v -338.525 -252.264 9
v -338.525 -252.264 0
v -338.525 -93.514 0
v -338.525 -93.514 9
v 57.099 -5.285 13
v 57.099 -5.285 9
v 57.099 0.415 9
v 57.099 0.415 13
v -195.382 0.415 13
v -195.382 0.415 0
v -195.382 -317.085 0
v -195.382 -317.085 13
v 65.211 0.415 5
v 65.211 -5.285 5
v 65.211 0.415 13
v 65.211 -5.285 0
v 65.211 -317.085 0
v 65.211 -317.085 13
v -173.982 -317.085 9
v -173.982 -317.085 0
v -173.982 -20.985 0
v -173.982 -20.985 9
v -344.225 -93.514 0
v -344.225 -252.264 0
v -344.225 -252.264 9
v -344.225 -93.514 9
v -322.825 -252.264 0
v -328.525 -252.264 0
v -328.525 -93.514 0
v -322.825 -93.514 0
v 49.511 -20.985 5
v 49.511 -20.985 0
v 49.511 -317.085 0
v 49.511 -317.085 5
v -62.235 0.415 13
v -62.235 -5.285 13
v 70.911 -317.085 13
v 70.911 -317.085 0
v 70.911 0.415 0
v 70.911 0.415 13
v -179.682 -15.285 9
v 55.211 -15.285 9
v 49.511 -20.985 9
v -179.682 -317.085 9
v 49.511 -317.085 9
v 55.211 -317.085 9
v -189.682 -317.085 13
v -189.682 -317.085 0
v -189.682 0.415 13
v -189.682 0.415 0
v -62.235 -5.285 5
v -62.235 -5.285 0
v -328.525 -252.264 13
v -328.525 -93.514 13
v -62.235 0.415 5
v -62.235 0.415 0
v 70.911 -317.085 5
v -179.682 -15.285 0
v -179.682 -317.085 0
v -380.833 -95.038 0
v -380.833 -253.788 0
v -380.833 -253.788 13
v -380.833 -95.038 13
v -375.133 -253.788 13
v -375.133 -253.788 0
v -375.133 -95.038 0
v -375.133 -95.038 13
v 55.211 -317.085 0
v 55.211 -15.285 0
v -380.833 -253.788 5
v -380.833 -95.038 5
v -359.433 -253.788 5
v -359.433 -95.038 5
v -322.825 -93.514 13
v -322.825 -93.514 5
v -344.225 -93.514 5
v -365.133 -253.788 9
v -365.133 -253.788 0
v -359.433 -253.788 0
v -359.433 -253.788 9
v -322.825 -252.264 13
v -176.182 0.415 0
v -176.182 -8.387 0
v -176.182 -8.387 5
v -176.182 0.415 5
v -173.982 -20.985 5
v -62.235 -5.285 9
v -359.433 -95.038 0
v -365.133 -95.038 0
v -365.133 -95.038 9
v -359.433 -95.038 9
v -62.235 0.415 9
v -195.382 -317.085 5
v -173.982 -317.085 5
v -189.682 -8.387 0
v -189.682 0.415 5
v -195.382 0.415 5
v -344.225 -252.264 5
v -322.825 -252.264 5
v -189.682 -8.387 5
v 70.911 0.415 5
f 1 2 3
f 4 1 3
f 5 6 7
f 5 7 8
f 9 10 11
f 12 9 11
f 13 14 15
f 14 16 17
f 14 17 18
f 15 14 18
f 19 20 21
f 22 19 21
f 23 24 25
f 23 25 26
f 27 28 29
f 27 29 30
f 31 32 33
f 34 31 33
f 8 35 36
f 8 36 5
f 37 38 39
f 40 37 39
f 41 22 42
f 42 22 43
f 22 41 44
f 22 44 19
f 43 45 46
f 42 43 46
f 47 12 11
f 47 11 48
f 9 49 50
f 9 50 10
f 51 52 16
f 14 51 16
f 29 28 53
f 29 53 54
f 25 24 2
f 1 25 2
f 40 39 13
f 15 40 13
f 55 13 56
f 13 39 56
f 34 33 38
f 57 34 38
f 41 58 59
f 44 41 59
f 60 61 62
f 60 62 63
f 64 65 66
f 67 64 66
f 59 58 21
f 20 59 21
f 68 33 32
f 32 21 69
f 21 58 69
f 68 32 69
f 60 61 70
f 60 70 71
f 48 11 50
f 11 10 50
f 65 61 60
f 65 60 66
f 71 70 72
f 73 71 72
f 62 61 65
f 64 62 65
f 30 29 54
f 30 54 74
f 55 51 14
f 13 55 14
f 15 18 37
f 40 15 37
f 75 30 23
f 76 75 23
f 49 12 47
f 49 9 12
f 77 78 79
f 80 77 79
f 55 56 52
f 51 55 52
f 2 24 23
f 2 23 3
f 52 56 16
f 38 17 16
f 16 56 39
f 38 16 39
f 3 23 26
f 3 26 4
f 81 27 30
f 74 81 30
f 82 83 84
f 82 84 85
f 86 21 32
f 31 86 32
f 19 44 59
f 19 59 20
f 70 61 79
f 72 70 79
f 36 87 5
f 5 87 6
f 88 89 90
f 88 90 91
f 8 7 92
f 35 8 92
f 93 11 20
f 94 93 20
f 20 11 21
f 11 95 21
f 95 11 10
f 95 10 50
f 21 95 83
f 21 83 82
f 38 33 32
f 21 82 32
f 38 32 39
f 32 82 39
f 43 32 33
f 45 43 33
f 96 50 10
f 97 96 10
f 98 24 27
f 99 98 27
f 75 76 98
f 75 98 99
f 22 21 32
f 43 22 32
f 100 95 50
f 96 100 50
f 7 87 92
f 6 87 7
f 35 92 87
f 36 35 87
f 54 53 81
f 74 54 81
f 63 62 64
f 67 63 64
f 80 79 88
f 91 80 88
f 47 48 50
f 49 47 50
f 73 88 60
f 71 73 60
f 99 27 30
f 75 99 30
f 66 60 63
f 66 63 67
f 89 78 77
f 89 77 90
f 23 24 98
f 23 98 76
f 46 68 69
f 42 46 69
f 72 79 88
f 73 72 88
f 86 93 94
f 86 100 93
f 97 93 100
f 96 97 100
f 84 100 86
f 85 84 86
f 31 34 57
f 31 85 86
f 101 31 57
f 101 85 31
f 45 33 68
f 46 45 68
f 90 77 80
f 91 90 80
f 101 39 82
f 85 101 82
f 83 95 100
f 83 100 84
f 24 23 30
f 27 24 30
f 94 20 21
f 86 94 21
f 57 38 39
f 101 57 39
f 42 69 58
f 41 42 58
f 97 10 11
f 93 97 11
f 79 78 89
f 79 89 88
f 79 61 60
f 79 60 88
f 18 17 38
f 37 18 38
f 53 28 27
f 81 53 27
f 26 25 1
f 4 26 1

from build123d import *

# Parameters (mm, degrees)
F1_DEPTH  = 13
F0_W      = 127.4468
F0_H      = 5.7
F2_DEPTH  = 5
F3_W      = 5.7
F3_H      = 158.75
F4_DEPTH  = 13
F3_W_2    = 10
F5_DEPTH  = 5
F6_W      = 234.8936
F6_H      = 4
F7_DEPTH  = 321.31
F8_W      = 8.1123012102
F8_H      = 4
F9_DEPTH  = 250
F10_W     = 127.4468
F10_H     = 4
F11_DEPTH = 6
F13_DEPTH = 9
F14_W     = 13.5
F14_H     = 8.8018592085
F15_DEPTH = 25


with BuildPart() as f1:
    # F0 (on Top) → F1 (new body)
    with BuildSketch(Plane.XY):
        Polygon((-195.3821017299, -20.985306791), (-195.3821017299, -317.085306791), (-189.6821017299, -317.085306791), (-189.6821017299, -15.285306791), (-189.6821017299, -5.285306791), (-189.6821017299, 0.414693209), (-195.3821017299, 0.414693209), align=None)
    extrude(amount=F1_DEPTH)


with BuildPart() as f1b:
    # F0 (on Top) → F1, piece 2 (new body)
    with BuildSketch(Plane.XY):
        Polygon((-62.2353017299, 0.414693209), (-62.2353017299, -5.285306791), (65.2114982701, -5.285306791), (65.2114982701, -317.085306791), (70.9114982701, -317.085306791), (70.9114982701, -20.985306791), (70.9114982701, -5.285306791), (70.9114982701, 0.414693209), align=None)
    extrude(amount=F1_DEPTH)

    # F8 (on Front) → F9 (cut, symmetric)
    with BuildSketch(Plane.XZ):
        with Locations((61.155347665, 11)):
            Rectangle(F8_W, F8_H)
    extrude(amount=F9_DEPTH, both=True, mode=Mode.SUBTRACT)

    # F10 (on Front) → F11 (cut, symmetric)
    with BuildSketch(Plane.XZ):
        with Locations((1.4880982701, 7)):
            Rectangle(F10_W, F10_H)
    extrude(amount=F11_DEPTH, both=True, mode=Mode.SUBTRACT)


with BuildPart() as f1c:
    # F0 (on Top) → F1, piece 3 (new body)
    with BuildSketch(Plane.XY):
        Polygon((-179.6821017299, -15.285306791), (-179.6821017299, -317.085306791), (-173.9821017299, -317.085306791), (-173.9821017299, -20.985306791), (-62.2353017299, -20.985306791), (-62.2353017299, -15.285306791), align=None)
        Polygon((55.2114982701, -15.285306791), (-62.2353017299, -15.285306791), (-62.2353017299, -20.985306791), (49.5114982701, -20.985306791), (49.5114982701, -317.085306791), (55.2114982701, -317.085306791), align=None)
    extrude(amount=F1_DEPTH)

    # F6 (on Front) → F7 (cut, symmetric)
    with BuildSketch(Plane.XZ):
        with Locations((-62.2353017299, 11)):
            Rectangle(F6_W, F6_H)
    extrude(amount=F7_DEPTH, both=True, mode=Mode.SUBTRACT)


with BuildPart() as f2:
    # F0 (on Top) → F2 (new body)
    with BuildSketch(Plane.XY):
        Polygon((-195.3821017299, -20.985306791), (-195.3821017299, -317.085306791), (-189.6821017299, -317.085306791), (-189.6821017299, -15.285306791), (-189.6821017299, -5.285306791), (-189.6821017299, 0.414693209), (-195.3821017299, 0.414693209), align=None)
        Polygon((-189.6821017299, -15.285306791), (-189.6821017299, -317.085306791), (-179.6821017299, -317.085306791), (-179.6821017299, -15.285306791), (-62.2353017299, -15.285306791), (-62.2353017299, -5.285306791), (-189.6821017299, -5.285306791), align=None)
        Polygon((-179.6821017299, -15.285306791), (-179.6821017299, -317.085306791), (-173.9821017299, -317.085306791), (-173.9821017299, -20.985306791), (-62.2353017299, -20.985306791), (-62.2353017299, -15.285306791), align=None)
        with Locations((-125.9587017299, -2.435306791)):
            Rectangle(F0_W, F0_H)
        Polygon((55.2114982701, -15.285306791), (-62.2353017299, -15.285306791), (-62.2353017299, -20.985306791), (49.5114982701, -20.985306791), (49.5114982701, -317.085306791), (55.2114982701, -317.085306791), align=None)
        Polygon((-62.2353017299, -5.285306791), (-62.2353017299, -15.285306791), (55.2114982701, -15.285306791), (55.2114982701, -317.085306791), (65.2114982701, -317.085306791), (65.2114982701, -5.285306791), align=None)
        Polygon((-62.2353017299, 0.414693209), (-62.2353017299, -5.285306791), (65.2114982701, -5.285306791), (65.2114982701, -317.085306791), (70.9114982701, -317.085306791), (70.9114982701, -20.985306791), (70.9114982701, -5.285306791), (70.9114982701, 0.414693209), align=None)
    extrude(amount=F2_DEPTH)

    # F14 (on Top) → F15 (cut)
    with BuildSketch(Plane.XY):
        with Locations((-182.9321017299, -3.9862363952)):
            Rectangle(F14_W, F14_H)
    extrude(amount=F15_DEPTH, mode=Mode.SUBTRACT)


with BuildPart() as f4:
    # F3 (on Top) → F4 (new body)
    with BuildSketch(Plane.XY):
        with Locations((-377.9834323733, -174.4130837469)):
            Rectangle(F3_W, F3_H)
    extrude(amount=F4_DEPTH)


with BuildPart() as f4b:
    # F3 (on Top) → F4, piece 2 (new body)
    with BuildSketch(Plane.XY):
        with Locations((-325.6750609583, -172.888782181)):
            Rectangle(F3_W, F3_H)
    extrude(amount=F4_DEPTH)


with BuildPart() as f5:
    # F3 (on Top) → F5 (new body)
    with BuildSketch(Plane.XY):
        with Locations((-377.9834323733, -174.4130837469)):
            Rectangle(F3_W, F3_H)
        with Locations((-370.1334323733, -174.4130837469)):
            Rectangle(F3_W_2, F3_H)
        with Locations((-362.2834323733, -174.4130837469)):
            Rectangle(F3_W, F3_H)
    extrude(amount=F5_DEPTH)


with BuildPart() as f5b:
    # F3 (on Top) → F5, piece 2 (new body)
    with BuildSketch(Plane.XY):
        with Locations((-341.3750609583, -172.888782181)):
            Rectangle(F3_W, F3_H)
        with Locations((-333.5250609583, -172.888782181)):
            Rectangle(F3_W_2, F3_H)
        with Locations((-325.6750609583, -172.888782181)):
            Rectangle(F3_W, F3_H)
    extrude(amount=F5_DEPTH)


with BuildPart() as f13:
    # F3 (on Top) → F13 (new body)
    with BuildSketch(Plane.XY):
        with Locations((-362.2834323733, -174.4130837469)):
            Rectangle(F3_W, F3_H)
    extrude(amount=F13_DEPTH)


with BuildPart() as f13b:
    # F3 (on Top) → F13, piece 2 (new body)
    with BuildSketch(Plane.XY):
        with Locations((-341.3750609583, -172.888782181)):
            Rectangle(F3_W, F3_H)
    extrude(amount=F13_DEPTH)


solid = Compound([f1.part, f1b.part, f1c.part, f2.part, f4.part, f4b.part, f5.part, f5b.part, f13.part, f13b.part])
